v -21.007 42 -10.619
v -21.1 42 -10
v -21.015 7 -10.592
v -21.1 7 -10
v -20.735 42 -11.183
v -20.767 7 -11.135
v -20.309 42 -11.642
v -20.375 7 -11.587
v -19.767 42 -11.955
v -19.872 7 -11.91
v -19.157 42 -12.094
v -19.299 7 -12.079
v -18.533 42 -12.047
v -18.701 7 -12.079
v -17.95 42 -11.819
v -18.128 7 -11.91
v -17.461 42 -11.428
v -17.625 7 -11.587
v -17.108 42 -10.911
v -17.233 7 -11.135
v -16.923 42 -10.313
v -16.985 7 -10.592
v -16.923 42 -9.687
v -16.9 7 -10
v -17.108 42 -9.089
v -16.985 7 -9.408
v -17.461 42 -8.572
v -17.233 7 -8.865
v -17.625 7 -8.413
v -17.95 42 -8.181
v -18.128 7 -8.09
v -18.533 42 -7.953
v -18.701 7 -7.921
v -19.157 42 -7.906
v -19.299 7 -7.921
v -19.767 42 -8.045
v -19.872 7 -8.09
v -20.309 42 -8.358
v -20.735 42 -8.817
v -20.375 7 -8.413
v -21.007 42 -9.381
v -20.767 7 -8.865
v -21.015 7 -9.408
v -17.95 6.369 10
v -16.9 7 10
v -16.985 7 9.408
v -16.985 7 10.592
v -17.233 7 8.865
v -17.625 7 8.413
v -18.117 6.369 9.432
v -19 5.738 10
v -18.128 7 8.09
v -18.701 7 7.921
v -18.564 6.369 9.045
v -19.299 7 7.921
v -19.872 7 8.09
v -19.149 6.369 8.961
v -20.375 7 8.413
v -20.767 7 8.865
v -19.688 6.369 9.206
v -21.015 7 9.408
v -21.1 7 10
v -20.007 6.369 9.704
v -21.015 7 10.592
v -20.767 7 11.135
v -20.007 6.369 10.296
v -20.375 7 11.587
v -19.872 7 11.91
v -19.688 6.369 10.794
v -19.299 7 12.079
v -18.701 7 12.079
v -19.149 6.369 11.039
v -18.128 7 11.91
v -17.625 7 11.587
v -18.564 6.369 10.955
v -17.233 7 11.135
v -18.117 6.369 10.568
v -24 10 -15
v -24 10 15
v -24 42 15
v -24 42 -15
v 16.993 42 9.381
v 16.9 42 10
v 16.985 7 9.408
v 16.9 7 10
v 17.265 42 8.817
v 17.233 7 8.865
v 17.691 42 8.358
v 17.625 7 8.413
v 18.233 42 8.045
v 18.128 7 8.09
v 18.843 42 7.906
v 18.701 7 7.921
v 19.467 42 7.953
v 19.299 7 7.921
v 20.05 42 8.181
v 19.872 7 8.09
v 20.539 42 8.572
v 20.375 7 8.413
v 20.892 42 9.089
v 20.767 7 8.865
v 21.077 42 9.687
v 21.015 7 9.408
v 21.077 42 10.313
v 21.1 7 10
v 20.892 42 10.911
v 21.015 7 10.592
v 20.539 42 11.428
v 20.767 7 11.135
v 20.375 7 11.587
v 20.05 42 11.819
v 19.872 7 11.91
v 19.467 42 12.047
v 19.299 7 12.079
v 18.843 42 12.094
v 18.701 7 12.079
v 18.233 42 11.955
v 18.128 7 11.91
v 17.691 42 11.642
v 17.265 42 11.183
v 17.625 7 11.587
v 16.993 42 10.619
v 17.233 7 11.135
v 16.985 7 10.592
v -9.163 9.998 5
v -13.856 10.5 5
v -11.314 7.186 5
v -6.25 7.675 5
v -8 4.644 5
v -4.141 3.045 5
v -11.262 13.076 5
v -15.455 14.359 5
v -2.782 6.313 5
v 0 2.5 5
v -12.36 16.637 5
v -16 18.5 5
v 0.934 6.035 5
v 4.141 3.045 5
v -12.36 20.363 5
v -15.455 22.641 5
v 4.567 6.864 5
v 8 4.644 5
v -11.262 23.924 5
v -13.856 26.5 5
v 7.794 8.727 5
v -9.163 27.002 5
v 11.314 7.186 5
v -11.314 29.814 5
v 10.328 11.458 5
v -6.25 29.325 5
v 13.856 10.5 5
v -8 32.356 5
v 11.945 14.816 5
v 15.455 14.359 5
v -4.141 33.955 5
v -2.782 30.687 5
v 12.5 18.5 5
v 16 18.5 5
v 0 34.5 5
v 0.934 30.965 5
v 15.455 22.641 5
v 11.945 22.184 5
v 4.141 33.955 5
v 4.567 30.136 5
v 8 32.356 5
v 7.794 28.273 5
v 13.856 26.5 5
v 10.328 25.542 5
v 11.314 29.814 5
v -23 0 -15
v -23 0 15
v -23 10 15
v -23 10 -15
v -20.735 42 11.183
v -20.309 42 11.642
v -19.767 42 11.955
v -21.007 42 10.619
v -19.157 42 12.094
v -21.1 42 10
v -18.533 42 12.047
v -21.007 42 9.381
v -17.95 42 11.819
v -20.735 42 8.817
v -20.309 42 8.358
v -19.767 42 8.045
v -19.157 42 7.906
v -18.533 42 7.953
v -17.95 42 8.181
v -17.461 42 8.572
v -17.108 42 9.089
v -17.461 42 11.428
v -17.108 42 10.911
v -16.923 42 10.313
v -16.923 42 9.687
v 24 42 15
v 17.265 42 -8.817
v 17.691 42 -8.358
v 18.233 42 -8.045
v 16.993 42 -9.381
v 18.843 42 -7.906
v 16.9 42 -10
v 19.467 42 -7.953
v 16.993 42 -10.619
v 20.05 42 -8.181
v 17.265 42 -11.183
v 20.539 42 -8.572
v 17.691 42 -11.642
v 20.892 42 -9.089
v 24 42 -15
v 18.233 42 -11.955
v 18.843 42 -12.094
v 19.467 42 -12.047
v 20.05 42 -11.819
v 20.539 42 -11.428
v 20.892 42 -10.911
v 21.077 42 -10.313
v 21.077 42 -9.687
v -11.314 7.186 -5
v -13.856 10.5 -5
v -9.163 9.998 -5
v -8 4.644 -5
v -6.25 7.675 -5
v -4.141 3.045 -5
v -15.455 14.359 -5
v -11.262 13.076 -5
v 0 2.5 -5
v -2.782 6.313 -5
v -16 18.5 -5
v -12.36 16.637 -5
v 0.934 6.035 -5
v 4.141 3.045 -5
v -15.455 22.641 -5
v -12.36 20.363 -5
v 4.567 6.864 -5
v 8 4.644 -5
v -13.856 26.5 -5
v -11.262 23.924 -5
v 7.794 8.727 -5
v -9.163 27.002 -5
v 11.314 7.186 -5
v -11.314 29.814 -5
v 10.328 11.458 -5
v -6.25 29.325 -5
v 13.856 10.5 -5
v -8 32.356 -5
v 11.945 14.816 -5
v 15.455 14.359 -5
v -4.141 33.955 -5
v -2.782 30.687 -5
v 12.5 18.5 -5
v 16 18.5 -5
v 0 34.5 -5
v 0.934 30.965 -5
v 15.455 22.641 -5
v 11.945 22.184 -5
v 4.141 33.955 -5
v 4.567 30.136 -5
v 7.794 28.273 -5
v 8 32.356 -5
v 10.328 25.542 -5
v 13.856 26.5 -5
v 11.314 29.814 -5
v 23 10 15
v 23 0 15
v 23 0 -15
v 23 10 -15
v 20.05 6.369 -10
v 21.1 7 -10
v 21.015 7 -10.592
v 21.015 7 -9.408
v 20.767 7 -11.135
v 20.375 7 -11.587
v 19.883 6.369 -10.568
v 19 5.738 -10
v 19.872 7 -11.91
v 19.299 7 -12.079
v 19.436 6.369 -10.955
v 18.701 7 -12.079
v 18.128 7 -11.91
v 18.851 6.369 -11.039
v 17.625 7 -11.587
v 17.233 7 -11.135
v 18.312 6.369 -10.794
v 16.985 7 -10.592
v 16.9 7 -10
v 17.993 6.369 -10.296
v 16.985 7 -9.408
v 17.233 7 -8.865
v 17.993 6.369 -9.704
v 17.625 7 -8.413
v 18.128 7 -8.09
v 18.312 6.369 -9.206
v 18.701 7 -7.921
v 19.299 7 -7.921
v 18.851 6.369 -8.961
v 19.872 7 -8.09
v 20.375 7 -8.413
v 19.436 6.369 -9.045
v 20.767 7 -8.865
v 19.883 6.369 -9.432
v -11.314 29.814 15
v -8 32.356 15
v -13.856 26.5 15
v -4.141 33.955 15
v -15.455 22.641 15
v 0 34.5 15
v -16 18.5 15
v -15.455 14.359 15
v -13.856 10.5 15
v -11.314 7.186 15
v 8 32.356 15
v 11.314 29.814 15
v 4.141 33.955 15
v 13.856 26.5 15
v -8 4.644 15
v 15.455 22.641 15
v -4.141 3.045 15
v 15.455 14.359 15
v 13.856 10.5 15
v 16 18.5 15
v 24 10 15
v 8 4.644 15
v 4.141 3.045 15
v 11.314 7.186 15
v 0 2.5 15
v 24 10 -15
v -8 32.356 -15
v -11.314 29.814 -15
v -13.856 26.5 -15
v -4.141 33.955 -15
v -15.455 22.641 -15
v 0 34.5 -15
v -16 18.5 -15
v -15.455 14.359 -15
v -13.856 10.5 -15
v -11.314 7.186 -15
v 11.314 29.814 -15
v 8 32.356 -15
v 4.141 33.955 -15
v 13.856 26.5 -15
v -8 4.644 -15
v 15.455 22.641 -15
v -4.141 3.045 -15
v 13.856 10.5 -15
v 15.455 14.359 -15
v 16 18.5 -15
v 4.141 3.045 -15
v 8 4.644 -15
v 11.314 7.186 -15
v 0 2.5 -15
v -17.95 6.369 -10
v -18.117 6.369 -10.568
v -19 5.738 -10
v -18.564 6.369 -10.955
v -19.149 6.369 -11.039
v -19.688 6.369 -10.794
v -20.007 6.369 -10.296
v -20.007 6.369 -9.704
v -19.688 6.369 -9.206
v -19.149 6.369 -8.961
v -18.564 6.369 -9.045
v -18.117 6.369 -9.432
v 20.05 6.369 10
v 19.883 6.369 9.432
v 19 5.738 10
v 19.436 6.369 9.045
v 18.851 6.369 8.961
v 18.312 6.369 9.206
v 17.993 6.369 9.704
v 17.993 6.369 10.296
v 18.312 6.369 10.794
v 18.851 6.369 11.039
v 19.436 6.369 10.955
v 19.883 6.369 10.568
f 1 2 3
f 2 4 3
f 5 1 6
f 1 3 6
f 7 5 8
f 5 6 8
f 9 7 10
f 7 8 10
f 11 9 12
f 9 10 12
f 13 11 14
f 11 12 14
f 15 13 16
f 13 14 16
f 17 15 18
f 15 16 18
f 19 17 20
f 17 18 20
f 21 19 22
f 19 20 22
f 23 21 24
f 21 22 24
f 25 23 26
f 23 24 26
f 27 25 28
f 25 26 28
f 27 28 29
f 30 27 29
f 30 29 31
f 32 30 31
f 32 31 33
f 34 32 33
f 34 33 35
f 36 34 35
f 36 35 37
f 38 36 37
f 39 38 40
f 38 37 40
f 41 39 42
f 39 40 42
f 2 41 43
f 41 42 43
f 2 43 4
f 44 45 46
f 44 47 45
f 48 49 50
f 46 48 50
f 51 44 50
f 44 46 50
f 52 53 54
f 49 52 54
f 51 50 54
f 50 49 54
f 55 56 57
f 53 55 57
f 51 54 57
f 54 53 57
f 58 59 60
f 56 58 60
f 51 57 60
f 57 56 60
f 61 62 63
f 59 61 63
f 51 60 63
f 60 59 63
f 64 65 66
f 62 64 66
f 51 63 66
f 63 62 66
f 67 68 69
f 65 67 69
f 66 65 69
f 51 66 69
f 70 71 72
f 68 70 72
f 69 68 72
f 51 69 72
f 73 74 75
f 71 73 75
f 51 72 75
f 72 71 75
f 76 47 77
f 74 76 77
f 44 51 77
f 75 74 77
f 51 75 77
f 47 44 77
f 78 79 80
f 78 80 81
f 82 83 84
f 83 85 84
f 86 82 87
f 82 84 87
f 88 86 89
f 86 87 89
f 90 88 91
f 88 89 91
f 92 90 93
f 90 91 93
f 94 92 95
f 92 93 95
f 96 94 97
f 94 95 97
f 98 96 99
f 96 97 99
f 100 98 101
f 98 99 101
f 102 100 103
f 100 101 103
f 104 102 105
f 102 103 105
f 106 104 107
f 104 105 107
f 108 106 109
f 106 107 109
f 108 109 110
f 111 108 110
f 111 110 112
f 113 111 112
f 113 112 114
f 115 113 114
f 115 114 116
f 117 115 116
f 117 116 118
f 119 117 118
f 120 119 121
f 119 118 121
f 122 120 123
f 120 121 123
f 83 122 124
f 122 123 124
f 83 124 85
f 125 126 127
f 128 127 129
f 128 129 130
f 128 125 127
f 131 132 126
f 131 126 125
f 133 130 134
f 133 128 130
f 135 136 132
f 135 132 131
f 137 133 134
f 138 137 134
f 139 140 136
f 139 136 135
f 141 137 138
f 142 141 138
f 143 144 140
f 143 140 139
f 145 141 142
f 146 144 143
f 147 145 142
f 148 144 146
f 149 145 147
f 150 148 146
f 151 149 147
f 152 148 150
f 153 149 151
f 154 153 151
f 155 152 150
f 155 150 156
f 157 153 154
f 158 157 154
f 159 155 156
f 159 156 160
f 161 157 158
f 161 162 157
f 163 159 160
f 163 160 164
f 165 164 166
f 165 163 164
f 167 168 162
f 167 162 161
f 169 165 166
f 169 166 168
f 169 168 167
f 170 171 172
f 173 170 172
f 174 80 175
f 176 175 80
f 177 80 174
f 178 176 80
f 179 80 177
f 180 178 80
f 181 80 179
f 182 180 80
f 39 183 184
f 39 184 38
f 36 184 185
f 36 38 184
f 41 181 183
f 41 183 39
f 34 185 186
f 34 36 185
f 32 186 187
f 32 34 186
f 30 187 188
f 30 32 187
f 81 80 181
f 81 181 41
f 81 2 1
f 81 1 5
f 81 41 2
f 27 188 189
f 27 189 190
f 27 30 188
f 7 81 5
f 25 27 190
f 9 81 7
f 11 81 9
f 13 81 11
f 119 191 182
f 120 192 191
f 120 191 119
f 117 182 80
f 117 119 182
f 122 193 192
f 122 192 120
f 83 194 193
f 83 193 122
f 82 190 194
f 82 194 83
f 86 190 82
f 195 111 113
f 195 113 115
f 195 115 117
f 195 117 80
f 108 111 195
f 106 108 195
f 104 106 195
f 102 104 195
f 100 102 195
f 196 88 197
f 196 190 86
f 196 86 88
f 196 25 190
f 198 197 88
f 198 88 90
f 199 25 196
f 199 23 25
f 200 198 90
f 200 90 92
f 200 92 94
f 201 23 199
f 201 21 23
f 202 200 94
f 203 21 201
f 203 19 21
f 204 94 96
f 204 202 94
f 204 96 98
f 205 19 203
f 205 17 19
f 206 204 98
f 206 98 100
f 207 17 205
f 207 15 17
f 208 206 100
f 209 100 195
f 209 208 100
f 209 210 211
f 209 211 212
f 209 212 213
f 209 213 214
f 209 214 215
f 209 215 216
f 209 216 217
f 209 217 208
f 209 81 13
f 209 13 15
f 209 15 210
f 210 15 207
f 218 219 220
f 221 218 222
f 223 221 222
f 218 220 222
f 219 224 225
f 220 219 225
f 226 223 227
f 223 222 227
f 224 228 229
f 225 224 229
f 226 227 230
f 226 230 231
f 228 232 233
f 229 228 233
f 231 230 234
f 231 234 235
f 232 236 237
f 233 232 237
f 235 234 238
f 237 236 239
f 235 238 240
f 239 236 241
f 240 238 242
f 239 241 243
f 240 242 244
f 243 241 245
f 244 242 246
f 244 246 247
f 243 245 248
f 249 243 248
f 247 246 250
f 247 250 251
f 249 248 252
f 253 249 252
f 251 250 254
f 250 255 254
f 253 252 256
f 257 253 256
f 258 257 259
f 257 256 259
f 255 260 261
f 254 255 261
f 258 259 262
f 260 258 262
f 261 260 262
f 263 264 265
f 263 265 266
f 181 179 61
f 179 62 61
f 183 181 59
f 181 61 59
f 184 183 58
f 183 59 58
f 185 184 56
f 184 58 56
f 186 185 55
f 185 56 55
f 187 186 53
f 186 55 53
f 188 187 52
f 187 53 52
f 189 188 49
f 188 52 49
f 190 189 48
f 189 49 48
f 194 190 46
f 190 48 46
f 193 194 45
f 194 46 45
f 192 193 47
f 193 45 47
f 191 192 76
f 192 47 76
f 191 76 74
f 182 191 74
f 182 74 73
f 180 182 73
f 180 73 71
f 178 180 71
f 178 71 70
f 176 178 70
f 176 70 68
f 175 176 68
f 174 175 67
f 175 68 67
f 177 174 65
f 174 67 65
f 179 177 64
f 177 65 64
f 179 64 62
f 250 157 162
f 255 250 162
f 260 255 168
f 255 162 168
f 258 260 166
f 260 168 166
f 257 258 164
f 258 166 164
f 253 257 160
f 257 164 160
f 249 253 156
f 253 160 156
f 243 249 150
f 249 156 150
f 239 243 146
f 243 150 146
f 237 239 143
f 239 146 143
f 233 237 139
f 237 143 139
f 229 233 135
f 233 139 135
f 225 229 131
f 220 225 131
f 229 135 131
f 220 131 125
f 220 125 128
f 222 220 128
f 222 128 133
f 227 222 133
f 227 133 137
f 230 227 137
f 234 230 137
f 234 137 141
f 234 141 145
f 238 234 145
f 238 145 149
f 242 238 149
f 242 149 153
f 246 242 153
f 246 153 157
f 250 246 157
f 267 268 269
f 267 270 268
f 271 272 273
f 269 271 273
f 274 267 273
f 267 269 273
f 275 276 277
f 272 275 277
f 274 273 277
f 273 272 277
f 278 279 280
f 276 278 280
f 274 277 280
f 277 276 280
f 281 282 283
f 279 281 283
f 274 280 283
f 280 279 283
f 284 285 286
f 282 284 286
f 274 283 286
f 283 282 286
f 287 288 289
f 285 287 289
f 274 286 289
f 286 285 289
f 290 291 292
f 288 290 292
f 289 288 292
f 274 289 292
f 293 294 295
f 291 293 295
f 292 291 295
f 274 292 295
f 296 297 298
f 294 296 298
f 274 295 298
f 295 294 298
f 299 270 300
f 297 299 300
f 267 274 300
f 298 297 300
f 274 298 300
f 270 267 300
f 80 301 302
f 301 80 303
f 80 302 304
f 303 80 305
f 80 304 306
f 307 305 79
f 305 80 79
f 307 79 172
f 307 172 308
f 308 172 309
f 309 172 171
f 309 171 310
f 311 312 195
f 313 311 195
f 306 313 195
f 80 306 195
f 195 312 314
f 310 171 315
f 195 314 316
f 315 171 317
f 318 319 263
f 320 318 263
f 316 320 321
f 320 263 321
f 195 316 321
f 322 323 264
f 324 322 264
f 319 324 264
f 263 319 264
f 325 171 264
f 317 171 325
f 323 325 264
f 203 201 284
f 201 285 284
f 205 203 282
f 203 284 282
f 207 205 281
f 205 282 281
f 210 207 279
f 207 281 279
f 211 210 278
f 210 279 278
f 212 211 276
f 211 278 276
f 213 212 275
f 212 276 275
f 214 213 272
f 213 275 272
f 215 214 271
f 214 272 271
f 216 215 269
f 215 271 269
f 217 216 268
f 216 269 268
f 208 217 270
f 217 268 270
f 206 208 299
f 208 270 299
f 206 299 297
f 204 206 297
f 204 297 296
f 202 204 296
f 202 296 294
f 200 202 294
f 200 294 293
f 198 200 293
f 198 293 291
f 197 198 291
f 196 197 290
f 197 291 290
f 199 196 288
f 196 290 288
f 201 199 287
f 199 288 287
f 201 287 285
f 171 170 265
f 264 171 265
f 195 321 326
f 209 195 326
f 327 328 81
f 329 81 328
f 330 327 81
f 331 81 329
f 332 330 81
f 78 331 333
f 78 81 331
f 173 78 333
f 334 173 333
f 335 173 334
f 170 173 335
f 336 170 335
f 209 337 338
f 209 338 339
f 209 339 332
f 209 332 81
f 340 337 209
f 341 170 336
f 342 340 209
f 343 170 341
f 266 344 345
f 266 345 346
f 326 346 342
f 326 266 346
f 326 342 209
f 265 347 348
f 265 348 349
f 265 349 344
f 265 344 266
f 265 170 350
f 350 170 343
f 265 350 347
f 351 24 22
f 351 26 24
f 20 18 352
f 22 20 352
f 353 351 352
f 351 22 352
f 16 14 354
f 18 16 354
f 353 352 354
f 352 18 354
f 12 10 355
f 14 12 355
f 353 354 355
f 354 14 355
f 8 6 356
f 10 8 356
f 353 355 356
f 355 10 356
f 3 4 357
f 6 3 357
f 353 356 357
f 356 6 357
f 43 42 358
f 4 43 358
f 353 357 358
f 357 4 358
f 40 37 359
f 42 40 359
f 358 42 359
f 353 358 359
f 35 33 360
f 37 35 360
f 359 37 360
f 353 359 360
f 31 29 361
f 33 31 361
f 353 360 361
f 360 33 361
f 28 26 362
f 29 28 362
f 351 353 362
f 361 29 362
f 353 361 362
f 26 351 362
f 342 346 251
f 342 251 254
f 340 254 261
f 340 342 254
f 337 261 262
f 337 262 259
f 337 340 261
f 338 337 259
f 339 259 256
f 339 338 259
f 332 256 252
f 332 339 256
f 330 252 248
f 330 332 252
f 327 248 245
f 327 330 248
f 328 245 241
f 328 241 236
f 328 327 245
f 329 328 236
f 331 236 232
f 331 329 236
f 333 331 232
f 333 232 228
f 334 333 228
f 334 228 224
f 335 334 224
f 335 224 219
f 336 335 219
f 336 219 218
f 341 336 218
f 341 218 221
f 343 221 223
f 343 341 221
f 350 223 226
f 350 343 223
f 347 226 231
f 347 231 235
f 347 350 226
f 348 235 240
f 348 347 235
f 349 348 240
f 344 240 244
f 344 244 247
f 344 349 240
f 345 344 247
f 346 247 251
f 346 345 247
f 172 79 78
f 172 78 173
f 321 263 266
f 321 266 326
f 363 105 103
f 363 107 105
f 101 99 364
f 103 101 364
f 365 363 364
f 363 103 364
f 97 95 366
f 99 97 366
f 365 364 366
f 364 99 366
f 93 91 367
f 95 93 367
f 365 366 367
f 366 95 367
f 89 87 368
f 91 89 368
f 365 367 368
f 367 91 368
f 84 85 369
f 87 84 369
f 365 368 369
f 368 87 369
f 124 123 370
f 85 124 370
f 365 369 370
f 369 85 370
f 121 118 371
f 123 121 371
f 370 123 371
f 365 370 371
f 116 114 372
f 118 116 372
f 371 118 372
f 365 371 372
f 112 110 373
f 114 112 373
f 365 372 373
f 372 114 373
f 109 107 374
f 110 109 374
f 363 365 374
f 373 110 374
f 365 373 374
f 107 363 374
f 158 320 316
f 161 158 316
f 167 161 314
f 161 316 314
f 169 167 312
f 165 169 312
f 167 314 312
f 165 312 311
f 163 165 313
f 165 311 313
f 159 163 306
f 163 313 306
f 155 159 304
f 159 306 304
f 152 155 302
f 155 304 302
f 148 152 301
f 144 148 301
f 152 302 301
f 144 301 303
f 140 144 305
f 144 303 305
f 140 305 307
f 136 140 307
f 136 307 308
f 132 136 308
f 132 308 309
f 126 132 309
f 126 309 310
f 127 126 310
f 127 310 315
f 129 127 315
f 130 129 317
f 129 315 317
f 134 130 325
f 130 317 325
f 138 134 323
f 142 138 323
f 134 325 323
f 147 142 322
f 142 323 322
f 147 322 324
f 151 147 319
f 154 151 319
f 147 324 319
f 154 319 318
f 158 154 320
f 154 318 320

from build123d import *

# Parameters (mm, degrees)
SZKIC1_W                       = 48
SZKIC1_H                       = 30
DODANIE_WYCI_GNI_CIE1_DEPTH    = 42
SZKIC3_R                       = 12.5
WYTNIJ_WYCI_GNI_CIE2_DEPTH     = 57.920997883
SZKIC4_R                       = 16
WYTNIJ_WYCI_GNI_CIE3_DEPTH     = 10
OTW_R_GWINTOWANY_M5X0_81_D     = 4.2
OTW_R_GWINTOWANY_M5X0_81_DEPTH = 35
OTW_R_GWINTOWANY_M5X0_81_TIP   = 1.2618073
SZKIC10_W                      = 1
SZKIC10_H                      = 10
WYTNIJ_WYCI_GNI_CIE4_DEPTH     = 57.920997883


with BuildPart() as part:
    # Szkic1 → Dodanie-wyciągnięcie1 (new body)
    with BuildSketch(Plane(origin=(0, 0, 0), x_dir=(1, 0, 0), z_dir=(0, 1, 0))):
        Rectangle(SZKIC1_W, SZKIC1_H)
    extrude(amount=DODANIE_WYCI_GNI_CIE1_DEPTH)

    # Szkic3 → Wytnij-wyciągnięcie2 (cut, through all)
    with BuildSketch(Plane.XY.offset(15)):
        with Locations((0, 18.5)):
            Circle(SZKIC3_R)
    extrude(amount=-WYTNIJ_WYCI_GNI_CIE2_DEPTH, mode=Mode.SUBTRACT)

    # Szkic4 → Wytnij-wyciągnięcie3 (cut)
    with BuildSketch(Plane.XY.offset(15)):
        with Locations((0, 18.5)):
            Circle(SZKIC4_R)
    wytnij_wyci_gni_cie3 = extrude(amount=-WYTNIJ_WYCI_GNI_CIE3_DEPTH, mode=Mode.SUBTRACT)

    # Lustro1: Wytnij-wyciągnięcie3 across plane
    add(wytnij_wyci_gni_cie3.mirror(Plane.XY), mode=Mode.SUBTRACT)

    # Otwór gwintowany M5x0.81
    with Locations(Plane(origin=(0, 42, 0), x_dir=(1, 0, 0), z_dir=(0, 1, 0))):
        with Locations((-19, -10), (-19, 10), (19, -10), (19, 10)):
            Hole(OTW_R_GWINTOWANY_M5X0_81_D / 2, depth=OTW_R_GWINTOWANY_M5X0_81_DEPTH)
            with Locations((0, 0, -(OTW_R_GWINTOWANY_M5X0_81_DEPTH + OTW_R_GWINTOWANY_M5X0_81_TIP / 2))):  # 118° drill point
                Cone(0, OTW_R_GWINTOWANY_M5X0_81_D / 2, OTW_R_GWINTOWANY_M5X0_81_TIP, mode=Mode.SUBTRACT)

    # Szkic10 → Wytnij-wyciągnięcie4 (cut, through all)
    with BuildSketch(Plane.XY.offset(15)):
        with Locations((23.5, 5)):
            Rectangle(SZKIC10_W, SZKIC10_H)
        with Locations((-23.5, 5)):
            Rectangle(SZKIC10_W, SZKIC10_H)
    extrude(amount=-WYTNIJ_WYCI_GNI_CIE4_DEPTH, mode=Mode.SUBTRACT)


solid = part.part
